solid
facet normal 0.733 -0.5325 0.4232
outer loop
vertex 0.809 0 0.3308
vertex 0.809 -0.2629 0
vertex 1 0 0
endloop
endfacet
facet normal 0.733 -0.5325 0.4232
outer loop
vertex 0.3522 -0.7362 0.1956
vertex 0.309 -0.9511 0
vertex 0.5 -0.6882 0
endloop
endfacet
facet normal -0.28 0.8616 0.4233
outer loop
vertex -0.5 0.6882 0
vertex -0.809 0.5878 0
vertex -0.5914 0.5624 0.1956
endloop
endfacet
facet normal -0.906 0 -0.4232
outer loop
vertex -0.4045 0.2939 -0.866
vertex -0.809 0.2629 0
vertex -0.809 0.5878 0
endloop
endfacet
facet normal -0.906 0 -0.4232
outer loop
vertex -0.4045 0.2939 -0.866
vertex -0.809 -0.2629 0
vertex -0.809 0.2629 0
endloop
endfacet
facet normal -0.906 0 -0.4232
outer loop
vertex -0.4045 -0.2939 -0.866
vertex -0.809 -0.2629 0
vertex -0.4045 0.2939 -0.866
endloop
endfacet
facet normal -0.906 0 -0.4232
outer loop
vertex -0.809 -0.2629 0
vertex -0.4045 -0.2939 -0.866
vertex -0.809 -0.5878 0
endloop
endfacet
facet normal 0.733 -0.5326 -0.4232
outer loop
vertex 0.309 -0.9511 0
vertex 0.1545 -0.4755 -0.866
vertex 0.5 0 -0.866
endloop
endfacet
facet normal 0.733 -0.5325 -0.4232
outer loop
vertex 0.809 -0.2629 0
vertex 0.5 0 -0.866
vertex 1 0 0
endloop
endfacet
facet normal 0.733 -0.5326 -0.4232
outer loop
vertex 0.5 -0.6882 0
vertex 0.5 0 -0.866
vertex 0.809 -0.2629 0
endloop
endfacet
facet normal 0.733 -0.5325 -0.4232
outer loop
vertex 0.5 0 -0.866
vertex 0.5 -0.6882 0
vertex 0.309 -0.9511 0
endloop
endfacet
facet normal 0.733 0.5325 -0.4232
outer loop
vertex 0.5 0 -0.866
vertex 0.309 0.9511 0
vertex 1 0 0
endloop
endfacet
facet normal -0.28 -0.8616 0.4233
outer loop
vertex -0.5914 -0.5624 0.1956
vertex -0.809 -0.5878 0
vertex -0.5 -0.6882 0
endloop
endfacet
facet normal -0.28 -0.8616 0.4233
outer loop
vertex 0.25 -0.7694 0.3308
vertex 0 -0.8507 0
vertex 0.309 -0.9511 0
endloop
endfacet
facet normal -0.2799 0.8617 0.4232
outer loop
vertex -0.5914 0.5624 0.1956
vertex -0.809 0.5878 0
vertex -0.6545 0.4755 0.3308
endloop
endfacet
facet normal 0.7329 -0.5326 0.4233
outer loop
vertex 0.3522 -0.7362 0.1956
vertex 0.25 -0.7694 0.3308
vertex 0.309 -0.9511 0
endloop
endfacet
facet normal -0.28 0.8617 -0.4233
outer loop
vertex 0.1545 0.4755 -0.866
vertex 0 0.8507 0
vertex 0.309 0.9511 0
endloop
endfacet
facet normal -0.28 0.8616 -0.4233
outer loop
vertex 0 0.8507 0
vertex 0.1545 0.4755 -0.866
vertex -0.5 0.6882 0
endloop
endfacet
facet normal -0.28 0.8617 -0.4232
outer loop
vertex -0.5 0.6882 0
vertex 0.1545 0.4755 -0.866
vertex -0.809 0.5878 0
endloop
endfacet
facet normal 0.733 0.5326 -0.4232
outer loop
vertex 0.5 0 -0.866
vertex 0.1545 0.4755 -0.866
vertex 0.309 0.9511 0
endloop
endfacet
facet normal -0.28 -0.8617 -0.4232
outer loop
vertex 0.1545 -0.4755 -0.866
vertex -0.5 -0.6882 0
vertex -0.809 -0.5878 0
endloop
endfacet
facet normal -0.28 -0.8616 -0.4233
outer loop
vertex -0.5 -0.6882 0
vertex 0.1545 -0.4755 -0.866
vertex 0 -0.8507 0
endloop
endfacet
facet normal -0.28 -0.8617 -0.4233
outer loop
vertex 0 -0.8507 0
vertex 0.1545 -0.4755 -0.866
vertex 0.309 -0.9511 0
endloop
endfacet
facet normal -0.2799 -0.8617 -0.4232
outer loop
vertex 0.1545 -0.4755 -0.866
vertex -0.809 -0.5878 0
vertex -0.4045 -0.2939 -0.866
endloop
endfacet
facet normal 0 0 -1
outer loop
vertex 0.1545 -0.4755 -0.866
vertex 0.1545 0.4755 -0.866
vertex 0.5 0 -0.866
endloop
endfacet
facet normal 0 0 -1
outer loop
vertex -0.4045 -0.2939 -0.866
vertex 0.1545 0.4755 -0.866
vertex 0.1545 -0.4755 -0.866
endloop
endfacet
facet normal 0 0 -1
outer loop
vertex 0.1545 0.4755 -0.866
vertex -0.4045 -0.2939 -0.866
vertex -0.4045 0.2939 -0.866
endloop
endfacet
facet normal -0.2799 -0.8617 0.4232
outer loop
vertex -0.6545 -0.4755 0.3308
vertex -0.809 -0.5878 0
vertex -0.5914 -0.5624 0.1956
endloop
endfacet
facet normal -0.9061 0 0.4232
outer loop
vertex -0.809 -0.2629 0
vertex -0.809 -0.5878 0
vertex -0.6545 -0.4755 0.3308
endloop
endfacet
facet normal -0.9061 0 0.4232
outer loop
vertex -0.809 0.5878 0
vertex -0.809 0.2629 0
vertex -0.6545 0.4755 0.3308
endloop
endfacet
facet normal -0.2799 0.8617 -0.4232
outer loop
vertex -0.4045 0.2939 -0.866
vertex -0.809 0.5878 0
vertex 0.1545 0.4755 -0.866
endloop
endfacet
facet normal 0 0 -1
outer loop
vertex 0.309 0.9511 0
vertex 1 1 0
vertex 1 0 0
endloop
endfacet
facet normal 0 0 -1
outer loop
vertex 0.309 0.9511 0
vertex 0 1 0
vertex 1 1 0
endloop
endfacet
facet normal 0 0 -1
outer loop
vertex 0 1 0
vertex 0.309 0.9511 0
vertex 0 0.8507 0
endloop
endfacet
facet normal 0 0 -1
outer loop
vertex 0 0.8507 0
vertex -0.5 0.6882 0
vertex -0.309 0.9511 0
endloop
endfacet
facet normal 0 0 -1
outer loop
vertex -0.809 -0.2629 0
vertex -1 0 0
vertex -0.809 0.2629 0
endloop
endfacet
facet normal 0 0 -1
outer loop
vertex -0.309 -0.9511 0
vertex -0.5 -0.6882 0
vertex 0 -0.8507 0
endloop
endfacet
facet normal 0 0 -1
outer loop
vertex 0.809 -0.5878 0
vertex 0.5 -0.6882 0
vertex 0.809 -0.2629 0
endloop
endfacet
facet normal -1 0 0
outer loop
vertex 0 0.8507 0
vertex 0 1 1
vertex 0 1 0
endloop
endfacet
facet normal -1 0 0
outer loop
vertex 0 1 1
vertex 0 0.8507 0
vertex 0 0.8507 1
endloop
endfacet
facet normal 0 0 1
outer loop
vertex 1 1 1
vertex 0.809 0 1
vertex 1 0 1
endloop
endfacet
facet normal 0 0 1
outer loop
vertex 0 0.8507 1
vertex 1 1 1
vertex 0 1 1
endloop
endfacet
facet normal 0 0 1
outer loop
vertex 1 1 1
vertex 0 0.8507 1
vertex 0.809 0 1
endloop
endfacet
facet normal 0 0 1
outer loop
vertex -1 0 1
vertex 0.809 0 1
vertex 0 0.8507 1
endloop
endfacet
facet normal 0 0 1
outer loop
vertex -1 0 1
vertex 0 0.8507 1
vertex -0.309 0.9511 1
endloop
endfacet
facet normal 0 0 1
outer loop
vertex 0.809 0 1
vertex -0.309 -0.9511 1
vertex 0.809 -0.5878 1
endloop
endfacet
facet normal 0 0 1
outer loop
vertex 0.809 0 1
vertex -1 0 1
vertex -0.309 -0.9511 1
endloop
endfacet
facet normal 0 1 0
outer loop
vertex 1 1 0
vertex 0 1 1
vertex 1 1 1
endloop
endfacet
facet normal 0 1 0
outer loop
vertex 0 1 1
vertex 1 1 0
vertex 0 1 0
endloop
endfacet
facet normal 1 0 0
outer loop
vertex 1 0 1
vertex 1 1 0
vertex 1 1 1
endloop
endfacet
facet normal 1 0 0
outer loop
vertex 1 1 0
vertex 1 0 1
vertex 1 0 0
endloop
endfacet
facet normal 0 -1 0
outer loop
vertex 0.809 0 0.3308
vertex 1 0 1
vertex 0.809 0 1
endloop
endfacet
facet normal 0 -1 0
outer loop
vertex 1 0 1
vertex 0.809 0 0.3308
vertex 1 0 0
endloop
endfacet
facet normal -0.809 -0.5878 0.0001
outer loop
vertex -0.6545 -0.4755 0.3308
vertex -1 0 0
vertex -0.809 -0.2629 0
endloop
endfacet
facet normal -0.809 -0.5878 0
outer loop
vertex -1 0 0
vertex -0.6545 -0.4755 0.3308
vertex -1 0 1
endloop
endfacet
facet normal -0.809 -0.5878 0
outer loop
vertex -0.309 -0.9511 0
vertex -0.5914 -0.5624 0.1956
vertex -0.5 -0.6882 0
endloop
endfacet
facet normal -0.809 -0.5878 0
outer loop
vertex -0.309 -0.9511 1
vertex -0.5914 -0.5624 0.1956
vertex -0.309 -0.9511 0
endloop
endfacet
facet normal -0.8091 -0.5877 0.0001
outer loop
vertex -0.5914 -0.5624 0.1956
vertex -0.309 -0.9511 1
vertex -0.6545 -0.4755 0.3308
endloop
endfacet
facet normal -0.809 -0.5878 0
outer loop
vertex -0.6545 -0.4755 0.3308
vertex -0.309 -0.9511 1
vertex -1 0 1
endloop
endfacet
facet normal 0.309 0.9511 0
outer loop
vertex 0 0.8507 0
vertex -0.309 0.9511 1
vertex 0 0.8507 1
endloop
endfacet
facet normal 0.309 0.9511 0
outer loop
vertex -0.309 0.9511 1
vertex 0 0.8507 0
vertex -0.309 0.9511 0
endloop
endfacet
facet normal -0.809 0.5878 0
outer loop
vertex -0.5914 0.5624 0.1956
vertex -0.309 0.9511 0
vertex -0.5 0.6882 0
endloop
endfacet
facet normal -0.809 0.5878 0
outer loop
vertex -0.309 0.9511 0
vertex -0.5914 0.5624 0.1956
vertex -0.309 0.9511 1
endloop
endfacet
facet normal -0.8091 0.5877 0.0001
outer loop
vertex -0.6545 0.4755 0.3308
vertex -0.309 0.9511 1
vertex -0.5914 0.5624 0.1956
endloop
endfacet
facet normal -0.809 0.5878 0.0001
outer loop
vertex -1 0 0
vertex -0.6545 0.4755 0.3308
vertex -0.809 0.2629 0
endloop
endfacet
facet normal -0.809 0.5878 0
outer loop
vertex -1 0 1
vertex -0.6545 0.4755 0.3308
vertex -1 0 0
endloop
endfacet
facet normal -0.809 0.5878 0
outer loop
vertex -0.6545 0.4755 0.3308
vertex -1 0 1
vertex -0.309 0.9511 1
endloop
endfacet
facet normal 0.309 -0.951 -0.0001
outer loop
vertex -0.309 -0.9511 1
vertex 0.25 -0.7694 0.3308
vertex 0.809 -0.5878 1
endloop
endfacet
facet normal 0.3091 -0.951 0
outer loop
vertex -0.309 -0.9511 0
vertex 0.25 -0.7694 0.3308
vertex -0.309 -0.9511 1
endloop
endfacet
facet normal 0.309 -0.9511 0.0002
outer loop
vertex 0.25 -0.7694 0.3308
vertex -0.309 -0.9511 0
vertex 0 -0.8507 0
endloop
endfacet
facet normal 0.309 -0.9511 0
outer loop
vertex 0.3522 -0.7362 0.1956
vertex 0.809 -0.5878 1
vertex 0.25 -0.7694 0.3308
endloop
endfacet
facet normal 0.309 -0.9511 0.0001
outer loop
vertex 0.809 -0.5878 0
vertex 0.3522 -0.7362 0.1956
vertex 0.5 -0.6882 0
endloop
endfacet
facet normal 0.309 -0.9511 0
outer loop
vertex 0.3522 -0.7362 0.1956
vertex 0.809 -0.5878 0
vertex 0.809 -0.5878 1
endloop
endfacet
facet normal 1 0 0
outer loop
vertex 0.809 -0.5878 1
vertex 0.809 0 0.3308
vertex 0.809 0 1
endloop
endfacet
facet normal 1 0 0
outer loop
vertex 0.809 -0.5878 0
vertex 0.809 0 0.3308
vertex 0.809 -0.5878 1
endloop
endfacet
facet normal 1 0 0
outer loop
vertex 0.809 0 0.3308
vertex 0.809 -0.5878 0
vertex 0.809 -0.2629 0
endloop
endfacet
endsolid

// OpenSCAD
sphere($fa = 0/0, $fs = 0/0);
linear_extrude(1, $fa = 0/0) square();
circle($fs = 0/0);
rotate_extrude($fa = 0/0) square();
offset(1, $fs = 0/0) square();
